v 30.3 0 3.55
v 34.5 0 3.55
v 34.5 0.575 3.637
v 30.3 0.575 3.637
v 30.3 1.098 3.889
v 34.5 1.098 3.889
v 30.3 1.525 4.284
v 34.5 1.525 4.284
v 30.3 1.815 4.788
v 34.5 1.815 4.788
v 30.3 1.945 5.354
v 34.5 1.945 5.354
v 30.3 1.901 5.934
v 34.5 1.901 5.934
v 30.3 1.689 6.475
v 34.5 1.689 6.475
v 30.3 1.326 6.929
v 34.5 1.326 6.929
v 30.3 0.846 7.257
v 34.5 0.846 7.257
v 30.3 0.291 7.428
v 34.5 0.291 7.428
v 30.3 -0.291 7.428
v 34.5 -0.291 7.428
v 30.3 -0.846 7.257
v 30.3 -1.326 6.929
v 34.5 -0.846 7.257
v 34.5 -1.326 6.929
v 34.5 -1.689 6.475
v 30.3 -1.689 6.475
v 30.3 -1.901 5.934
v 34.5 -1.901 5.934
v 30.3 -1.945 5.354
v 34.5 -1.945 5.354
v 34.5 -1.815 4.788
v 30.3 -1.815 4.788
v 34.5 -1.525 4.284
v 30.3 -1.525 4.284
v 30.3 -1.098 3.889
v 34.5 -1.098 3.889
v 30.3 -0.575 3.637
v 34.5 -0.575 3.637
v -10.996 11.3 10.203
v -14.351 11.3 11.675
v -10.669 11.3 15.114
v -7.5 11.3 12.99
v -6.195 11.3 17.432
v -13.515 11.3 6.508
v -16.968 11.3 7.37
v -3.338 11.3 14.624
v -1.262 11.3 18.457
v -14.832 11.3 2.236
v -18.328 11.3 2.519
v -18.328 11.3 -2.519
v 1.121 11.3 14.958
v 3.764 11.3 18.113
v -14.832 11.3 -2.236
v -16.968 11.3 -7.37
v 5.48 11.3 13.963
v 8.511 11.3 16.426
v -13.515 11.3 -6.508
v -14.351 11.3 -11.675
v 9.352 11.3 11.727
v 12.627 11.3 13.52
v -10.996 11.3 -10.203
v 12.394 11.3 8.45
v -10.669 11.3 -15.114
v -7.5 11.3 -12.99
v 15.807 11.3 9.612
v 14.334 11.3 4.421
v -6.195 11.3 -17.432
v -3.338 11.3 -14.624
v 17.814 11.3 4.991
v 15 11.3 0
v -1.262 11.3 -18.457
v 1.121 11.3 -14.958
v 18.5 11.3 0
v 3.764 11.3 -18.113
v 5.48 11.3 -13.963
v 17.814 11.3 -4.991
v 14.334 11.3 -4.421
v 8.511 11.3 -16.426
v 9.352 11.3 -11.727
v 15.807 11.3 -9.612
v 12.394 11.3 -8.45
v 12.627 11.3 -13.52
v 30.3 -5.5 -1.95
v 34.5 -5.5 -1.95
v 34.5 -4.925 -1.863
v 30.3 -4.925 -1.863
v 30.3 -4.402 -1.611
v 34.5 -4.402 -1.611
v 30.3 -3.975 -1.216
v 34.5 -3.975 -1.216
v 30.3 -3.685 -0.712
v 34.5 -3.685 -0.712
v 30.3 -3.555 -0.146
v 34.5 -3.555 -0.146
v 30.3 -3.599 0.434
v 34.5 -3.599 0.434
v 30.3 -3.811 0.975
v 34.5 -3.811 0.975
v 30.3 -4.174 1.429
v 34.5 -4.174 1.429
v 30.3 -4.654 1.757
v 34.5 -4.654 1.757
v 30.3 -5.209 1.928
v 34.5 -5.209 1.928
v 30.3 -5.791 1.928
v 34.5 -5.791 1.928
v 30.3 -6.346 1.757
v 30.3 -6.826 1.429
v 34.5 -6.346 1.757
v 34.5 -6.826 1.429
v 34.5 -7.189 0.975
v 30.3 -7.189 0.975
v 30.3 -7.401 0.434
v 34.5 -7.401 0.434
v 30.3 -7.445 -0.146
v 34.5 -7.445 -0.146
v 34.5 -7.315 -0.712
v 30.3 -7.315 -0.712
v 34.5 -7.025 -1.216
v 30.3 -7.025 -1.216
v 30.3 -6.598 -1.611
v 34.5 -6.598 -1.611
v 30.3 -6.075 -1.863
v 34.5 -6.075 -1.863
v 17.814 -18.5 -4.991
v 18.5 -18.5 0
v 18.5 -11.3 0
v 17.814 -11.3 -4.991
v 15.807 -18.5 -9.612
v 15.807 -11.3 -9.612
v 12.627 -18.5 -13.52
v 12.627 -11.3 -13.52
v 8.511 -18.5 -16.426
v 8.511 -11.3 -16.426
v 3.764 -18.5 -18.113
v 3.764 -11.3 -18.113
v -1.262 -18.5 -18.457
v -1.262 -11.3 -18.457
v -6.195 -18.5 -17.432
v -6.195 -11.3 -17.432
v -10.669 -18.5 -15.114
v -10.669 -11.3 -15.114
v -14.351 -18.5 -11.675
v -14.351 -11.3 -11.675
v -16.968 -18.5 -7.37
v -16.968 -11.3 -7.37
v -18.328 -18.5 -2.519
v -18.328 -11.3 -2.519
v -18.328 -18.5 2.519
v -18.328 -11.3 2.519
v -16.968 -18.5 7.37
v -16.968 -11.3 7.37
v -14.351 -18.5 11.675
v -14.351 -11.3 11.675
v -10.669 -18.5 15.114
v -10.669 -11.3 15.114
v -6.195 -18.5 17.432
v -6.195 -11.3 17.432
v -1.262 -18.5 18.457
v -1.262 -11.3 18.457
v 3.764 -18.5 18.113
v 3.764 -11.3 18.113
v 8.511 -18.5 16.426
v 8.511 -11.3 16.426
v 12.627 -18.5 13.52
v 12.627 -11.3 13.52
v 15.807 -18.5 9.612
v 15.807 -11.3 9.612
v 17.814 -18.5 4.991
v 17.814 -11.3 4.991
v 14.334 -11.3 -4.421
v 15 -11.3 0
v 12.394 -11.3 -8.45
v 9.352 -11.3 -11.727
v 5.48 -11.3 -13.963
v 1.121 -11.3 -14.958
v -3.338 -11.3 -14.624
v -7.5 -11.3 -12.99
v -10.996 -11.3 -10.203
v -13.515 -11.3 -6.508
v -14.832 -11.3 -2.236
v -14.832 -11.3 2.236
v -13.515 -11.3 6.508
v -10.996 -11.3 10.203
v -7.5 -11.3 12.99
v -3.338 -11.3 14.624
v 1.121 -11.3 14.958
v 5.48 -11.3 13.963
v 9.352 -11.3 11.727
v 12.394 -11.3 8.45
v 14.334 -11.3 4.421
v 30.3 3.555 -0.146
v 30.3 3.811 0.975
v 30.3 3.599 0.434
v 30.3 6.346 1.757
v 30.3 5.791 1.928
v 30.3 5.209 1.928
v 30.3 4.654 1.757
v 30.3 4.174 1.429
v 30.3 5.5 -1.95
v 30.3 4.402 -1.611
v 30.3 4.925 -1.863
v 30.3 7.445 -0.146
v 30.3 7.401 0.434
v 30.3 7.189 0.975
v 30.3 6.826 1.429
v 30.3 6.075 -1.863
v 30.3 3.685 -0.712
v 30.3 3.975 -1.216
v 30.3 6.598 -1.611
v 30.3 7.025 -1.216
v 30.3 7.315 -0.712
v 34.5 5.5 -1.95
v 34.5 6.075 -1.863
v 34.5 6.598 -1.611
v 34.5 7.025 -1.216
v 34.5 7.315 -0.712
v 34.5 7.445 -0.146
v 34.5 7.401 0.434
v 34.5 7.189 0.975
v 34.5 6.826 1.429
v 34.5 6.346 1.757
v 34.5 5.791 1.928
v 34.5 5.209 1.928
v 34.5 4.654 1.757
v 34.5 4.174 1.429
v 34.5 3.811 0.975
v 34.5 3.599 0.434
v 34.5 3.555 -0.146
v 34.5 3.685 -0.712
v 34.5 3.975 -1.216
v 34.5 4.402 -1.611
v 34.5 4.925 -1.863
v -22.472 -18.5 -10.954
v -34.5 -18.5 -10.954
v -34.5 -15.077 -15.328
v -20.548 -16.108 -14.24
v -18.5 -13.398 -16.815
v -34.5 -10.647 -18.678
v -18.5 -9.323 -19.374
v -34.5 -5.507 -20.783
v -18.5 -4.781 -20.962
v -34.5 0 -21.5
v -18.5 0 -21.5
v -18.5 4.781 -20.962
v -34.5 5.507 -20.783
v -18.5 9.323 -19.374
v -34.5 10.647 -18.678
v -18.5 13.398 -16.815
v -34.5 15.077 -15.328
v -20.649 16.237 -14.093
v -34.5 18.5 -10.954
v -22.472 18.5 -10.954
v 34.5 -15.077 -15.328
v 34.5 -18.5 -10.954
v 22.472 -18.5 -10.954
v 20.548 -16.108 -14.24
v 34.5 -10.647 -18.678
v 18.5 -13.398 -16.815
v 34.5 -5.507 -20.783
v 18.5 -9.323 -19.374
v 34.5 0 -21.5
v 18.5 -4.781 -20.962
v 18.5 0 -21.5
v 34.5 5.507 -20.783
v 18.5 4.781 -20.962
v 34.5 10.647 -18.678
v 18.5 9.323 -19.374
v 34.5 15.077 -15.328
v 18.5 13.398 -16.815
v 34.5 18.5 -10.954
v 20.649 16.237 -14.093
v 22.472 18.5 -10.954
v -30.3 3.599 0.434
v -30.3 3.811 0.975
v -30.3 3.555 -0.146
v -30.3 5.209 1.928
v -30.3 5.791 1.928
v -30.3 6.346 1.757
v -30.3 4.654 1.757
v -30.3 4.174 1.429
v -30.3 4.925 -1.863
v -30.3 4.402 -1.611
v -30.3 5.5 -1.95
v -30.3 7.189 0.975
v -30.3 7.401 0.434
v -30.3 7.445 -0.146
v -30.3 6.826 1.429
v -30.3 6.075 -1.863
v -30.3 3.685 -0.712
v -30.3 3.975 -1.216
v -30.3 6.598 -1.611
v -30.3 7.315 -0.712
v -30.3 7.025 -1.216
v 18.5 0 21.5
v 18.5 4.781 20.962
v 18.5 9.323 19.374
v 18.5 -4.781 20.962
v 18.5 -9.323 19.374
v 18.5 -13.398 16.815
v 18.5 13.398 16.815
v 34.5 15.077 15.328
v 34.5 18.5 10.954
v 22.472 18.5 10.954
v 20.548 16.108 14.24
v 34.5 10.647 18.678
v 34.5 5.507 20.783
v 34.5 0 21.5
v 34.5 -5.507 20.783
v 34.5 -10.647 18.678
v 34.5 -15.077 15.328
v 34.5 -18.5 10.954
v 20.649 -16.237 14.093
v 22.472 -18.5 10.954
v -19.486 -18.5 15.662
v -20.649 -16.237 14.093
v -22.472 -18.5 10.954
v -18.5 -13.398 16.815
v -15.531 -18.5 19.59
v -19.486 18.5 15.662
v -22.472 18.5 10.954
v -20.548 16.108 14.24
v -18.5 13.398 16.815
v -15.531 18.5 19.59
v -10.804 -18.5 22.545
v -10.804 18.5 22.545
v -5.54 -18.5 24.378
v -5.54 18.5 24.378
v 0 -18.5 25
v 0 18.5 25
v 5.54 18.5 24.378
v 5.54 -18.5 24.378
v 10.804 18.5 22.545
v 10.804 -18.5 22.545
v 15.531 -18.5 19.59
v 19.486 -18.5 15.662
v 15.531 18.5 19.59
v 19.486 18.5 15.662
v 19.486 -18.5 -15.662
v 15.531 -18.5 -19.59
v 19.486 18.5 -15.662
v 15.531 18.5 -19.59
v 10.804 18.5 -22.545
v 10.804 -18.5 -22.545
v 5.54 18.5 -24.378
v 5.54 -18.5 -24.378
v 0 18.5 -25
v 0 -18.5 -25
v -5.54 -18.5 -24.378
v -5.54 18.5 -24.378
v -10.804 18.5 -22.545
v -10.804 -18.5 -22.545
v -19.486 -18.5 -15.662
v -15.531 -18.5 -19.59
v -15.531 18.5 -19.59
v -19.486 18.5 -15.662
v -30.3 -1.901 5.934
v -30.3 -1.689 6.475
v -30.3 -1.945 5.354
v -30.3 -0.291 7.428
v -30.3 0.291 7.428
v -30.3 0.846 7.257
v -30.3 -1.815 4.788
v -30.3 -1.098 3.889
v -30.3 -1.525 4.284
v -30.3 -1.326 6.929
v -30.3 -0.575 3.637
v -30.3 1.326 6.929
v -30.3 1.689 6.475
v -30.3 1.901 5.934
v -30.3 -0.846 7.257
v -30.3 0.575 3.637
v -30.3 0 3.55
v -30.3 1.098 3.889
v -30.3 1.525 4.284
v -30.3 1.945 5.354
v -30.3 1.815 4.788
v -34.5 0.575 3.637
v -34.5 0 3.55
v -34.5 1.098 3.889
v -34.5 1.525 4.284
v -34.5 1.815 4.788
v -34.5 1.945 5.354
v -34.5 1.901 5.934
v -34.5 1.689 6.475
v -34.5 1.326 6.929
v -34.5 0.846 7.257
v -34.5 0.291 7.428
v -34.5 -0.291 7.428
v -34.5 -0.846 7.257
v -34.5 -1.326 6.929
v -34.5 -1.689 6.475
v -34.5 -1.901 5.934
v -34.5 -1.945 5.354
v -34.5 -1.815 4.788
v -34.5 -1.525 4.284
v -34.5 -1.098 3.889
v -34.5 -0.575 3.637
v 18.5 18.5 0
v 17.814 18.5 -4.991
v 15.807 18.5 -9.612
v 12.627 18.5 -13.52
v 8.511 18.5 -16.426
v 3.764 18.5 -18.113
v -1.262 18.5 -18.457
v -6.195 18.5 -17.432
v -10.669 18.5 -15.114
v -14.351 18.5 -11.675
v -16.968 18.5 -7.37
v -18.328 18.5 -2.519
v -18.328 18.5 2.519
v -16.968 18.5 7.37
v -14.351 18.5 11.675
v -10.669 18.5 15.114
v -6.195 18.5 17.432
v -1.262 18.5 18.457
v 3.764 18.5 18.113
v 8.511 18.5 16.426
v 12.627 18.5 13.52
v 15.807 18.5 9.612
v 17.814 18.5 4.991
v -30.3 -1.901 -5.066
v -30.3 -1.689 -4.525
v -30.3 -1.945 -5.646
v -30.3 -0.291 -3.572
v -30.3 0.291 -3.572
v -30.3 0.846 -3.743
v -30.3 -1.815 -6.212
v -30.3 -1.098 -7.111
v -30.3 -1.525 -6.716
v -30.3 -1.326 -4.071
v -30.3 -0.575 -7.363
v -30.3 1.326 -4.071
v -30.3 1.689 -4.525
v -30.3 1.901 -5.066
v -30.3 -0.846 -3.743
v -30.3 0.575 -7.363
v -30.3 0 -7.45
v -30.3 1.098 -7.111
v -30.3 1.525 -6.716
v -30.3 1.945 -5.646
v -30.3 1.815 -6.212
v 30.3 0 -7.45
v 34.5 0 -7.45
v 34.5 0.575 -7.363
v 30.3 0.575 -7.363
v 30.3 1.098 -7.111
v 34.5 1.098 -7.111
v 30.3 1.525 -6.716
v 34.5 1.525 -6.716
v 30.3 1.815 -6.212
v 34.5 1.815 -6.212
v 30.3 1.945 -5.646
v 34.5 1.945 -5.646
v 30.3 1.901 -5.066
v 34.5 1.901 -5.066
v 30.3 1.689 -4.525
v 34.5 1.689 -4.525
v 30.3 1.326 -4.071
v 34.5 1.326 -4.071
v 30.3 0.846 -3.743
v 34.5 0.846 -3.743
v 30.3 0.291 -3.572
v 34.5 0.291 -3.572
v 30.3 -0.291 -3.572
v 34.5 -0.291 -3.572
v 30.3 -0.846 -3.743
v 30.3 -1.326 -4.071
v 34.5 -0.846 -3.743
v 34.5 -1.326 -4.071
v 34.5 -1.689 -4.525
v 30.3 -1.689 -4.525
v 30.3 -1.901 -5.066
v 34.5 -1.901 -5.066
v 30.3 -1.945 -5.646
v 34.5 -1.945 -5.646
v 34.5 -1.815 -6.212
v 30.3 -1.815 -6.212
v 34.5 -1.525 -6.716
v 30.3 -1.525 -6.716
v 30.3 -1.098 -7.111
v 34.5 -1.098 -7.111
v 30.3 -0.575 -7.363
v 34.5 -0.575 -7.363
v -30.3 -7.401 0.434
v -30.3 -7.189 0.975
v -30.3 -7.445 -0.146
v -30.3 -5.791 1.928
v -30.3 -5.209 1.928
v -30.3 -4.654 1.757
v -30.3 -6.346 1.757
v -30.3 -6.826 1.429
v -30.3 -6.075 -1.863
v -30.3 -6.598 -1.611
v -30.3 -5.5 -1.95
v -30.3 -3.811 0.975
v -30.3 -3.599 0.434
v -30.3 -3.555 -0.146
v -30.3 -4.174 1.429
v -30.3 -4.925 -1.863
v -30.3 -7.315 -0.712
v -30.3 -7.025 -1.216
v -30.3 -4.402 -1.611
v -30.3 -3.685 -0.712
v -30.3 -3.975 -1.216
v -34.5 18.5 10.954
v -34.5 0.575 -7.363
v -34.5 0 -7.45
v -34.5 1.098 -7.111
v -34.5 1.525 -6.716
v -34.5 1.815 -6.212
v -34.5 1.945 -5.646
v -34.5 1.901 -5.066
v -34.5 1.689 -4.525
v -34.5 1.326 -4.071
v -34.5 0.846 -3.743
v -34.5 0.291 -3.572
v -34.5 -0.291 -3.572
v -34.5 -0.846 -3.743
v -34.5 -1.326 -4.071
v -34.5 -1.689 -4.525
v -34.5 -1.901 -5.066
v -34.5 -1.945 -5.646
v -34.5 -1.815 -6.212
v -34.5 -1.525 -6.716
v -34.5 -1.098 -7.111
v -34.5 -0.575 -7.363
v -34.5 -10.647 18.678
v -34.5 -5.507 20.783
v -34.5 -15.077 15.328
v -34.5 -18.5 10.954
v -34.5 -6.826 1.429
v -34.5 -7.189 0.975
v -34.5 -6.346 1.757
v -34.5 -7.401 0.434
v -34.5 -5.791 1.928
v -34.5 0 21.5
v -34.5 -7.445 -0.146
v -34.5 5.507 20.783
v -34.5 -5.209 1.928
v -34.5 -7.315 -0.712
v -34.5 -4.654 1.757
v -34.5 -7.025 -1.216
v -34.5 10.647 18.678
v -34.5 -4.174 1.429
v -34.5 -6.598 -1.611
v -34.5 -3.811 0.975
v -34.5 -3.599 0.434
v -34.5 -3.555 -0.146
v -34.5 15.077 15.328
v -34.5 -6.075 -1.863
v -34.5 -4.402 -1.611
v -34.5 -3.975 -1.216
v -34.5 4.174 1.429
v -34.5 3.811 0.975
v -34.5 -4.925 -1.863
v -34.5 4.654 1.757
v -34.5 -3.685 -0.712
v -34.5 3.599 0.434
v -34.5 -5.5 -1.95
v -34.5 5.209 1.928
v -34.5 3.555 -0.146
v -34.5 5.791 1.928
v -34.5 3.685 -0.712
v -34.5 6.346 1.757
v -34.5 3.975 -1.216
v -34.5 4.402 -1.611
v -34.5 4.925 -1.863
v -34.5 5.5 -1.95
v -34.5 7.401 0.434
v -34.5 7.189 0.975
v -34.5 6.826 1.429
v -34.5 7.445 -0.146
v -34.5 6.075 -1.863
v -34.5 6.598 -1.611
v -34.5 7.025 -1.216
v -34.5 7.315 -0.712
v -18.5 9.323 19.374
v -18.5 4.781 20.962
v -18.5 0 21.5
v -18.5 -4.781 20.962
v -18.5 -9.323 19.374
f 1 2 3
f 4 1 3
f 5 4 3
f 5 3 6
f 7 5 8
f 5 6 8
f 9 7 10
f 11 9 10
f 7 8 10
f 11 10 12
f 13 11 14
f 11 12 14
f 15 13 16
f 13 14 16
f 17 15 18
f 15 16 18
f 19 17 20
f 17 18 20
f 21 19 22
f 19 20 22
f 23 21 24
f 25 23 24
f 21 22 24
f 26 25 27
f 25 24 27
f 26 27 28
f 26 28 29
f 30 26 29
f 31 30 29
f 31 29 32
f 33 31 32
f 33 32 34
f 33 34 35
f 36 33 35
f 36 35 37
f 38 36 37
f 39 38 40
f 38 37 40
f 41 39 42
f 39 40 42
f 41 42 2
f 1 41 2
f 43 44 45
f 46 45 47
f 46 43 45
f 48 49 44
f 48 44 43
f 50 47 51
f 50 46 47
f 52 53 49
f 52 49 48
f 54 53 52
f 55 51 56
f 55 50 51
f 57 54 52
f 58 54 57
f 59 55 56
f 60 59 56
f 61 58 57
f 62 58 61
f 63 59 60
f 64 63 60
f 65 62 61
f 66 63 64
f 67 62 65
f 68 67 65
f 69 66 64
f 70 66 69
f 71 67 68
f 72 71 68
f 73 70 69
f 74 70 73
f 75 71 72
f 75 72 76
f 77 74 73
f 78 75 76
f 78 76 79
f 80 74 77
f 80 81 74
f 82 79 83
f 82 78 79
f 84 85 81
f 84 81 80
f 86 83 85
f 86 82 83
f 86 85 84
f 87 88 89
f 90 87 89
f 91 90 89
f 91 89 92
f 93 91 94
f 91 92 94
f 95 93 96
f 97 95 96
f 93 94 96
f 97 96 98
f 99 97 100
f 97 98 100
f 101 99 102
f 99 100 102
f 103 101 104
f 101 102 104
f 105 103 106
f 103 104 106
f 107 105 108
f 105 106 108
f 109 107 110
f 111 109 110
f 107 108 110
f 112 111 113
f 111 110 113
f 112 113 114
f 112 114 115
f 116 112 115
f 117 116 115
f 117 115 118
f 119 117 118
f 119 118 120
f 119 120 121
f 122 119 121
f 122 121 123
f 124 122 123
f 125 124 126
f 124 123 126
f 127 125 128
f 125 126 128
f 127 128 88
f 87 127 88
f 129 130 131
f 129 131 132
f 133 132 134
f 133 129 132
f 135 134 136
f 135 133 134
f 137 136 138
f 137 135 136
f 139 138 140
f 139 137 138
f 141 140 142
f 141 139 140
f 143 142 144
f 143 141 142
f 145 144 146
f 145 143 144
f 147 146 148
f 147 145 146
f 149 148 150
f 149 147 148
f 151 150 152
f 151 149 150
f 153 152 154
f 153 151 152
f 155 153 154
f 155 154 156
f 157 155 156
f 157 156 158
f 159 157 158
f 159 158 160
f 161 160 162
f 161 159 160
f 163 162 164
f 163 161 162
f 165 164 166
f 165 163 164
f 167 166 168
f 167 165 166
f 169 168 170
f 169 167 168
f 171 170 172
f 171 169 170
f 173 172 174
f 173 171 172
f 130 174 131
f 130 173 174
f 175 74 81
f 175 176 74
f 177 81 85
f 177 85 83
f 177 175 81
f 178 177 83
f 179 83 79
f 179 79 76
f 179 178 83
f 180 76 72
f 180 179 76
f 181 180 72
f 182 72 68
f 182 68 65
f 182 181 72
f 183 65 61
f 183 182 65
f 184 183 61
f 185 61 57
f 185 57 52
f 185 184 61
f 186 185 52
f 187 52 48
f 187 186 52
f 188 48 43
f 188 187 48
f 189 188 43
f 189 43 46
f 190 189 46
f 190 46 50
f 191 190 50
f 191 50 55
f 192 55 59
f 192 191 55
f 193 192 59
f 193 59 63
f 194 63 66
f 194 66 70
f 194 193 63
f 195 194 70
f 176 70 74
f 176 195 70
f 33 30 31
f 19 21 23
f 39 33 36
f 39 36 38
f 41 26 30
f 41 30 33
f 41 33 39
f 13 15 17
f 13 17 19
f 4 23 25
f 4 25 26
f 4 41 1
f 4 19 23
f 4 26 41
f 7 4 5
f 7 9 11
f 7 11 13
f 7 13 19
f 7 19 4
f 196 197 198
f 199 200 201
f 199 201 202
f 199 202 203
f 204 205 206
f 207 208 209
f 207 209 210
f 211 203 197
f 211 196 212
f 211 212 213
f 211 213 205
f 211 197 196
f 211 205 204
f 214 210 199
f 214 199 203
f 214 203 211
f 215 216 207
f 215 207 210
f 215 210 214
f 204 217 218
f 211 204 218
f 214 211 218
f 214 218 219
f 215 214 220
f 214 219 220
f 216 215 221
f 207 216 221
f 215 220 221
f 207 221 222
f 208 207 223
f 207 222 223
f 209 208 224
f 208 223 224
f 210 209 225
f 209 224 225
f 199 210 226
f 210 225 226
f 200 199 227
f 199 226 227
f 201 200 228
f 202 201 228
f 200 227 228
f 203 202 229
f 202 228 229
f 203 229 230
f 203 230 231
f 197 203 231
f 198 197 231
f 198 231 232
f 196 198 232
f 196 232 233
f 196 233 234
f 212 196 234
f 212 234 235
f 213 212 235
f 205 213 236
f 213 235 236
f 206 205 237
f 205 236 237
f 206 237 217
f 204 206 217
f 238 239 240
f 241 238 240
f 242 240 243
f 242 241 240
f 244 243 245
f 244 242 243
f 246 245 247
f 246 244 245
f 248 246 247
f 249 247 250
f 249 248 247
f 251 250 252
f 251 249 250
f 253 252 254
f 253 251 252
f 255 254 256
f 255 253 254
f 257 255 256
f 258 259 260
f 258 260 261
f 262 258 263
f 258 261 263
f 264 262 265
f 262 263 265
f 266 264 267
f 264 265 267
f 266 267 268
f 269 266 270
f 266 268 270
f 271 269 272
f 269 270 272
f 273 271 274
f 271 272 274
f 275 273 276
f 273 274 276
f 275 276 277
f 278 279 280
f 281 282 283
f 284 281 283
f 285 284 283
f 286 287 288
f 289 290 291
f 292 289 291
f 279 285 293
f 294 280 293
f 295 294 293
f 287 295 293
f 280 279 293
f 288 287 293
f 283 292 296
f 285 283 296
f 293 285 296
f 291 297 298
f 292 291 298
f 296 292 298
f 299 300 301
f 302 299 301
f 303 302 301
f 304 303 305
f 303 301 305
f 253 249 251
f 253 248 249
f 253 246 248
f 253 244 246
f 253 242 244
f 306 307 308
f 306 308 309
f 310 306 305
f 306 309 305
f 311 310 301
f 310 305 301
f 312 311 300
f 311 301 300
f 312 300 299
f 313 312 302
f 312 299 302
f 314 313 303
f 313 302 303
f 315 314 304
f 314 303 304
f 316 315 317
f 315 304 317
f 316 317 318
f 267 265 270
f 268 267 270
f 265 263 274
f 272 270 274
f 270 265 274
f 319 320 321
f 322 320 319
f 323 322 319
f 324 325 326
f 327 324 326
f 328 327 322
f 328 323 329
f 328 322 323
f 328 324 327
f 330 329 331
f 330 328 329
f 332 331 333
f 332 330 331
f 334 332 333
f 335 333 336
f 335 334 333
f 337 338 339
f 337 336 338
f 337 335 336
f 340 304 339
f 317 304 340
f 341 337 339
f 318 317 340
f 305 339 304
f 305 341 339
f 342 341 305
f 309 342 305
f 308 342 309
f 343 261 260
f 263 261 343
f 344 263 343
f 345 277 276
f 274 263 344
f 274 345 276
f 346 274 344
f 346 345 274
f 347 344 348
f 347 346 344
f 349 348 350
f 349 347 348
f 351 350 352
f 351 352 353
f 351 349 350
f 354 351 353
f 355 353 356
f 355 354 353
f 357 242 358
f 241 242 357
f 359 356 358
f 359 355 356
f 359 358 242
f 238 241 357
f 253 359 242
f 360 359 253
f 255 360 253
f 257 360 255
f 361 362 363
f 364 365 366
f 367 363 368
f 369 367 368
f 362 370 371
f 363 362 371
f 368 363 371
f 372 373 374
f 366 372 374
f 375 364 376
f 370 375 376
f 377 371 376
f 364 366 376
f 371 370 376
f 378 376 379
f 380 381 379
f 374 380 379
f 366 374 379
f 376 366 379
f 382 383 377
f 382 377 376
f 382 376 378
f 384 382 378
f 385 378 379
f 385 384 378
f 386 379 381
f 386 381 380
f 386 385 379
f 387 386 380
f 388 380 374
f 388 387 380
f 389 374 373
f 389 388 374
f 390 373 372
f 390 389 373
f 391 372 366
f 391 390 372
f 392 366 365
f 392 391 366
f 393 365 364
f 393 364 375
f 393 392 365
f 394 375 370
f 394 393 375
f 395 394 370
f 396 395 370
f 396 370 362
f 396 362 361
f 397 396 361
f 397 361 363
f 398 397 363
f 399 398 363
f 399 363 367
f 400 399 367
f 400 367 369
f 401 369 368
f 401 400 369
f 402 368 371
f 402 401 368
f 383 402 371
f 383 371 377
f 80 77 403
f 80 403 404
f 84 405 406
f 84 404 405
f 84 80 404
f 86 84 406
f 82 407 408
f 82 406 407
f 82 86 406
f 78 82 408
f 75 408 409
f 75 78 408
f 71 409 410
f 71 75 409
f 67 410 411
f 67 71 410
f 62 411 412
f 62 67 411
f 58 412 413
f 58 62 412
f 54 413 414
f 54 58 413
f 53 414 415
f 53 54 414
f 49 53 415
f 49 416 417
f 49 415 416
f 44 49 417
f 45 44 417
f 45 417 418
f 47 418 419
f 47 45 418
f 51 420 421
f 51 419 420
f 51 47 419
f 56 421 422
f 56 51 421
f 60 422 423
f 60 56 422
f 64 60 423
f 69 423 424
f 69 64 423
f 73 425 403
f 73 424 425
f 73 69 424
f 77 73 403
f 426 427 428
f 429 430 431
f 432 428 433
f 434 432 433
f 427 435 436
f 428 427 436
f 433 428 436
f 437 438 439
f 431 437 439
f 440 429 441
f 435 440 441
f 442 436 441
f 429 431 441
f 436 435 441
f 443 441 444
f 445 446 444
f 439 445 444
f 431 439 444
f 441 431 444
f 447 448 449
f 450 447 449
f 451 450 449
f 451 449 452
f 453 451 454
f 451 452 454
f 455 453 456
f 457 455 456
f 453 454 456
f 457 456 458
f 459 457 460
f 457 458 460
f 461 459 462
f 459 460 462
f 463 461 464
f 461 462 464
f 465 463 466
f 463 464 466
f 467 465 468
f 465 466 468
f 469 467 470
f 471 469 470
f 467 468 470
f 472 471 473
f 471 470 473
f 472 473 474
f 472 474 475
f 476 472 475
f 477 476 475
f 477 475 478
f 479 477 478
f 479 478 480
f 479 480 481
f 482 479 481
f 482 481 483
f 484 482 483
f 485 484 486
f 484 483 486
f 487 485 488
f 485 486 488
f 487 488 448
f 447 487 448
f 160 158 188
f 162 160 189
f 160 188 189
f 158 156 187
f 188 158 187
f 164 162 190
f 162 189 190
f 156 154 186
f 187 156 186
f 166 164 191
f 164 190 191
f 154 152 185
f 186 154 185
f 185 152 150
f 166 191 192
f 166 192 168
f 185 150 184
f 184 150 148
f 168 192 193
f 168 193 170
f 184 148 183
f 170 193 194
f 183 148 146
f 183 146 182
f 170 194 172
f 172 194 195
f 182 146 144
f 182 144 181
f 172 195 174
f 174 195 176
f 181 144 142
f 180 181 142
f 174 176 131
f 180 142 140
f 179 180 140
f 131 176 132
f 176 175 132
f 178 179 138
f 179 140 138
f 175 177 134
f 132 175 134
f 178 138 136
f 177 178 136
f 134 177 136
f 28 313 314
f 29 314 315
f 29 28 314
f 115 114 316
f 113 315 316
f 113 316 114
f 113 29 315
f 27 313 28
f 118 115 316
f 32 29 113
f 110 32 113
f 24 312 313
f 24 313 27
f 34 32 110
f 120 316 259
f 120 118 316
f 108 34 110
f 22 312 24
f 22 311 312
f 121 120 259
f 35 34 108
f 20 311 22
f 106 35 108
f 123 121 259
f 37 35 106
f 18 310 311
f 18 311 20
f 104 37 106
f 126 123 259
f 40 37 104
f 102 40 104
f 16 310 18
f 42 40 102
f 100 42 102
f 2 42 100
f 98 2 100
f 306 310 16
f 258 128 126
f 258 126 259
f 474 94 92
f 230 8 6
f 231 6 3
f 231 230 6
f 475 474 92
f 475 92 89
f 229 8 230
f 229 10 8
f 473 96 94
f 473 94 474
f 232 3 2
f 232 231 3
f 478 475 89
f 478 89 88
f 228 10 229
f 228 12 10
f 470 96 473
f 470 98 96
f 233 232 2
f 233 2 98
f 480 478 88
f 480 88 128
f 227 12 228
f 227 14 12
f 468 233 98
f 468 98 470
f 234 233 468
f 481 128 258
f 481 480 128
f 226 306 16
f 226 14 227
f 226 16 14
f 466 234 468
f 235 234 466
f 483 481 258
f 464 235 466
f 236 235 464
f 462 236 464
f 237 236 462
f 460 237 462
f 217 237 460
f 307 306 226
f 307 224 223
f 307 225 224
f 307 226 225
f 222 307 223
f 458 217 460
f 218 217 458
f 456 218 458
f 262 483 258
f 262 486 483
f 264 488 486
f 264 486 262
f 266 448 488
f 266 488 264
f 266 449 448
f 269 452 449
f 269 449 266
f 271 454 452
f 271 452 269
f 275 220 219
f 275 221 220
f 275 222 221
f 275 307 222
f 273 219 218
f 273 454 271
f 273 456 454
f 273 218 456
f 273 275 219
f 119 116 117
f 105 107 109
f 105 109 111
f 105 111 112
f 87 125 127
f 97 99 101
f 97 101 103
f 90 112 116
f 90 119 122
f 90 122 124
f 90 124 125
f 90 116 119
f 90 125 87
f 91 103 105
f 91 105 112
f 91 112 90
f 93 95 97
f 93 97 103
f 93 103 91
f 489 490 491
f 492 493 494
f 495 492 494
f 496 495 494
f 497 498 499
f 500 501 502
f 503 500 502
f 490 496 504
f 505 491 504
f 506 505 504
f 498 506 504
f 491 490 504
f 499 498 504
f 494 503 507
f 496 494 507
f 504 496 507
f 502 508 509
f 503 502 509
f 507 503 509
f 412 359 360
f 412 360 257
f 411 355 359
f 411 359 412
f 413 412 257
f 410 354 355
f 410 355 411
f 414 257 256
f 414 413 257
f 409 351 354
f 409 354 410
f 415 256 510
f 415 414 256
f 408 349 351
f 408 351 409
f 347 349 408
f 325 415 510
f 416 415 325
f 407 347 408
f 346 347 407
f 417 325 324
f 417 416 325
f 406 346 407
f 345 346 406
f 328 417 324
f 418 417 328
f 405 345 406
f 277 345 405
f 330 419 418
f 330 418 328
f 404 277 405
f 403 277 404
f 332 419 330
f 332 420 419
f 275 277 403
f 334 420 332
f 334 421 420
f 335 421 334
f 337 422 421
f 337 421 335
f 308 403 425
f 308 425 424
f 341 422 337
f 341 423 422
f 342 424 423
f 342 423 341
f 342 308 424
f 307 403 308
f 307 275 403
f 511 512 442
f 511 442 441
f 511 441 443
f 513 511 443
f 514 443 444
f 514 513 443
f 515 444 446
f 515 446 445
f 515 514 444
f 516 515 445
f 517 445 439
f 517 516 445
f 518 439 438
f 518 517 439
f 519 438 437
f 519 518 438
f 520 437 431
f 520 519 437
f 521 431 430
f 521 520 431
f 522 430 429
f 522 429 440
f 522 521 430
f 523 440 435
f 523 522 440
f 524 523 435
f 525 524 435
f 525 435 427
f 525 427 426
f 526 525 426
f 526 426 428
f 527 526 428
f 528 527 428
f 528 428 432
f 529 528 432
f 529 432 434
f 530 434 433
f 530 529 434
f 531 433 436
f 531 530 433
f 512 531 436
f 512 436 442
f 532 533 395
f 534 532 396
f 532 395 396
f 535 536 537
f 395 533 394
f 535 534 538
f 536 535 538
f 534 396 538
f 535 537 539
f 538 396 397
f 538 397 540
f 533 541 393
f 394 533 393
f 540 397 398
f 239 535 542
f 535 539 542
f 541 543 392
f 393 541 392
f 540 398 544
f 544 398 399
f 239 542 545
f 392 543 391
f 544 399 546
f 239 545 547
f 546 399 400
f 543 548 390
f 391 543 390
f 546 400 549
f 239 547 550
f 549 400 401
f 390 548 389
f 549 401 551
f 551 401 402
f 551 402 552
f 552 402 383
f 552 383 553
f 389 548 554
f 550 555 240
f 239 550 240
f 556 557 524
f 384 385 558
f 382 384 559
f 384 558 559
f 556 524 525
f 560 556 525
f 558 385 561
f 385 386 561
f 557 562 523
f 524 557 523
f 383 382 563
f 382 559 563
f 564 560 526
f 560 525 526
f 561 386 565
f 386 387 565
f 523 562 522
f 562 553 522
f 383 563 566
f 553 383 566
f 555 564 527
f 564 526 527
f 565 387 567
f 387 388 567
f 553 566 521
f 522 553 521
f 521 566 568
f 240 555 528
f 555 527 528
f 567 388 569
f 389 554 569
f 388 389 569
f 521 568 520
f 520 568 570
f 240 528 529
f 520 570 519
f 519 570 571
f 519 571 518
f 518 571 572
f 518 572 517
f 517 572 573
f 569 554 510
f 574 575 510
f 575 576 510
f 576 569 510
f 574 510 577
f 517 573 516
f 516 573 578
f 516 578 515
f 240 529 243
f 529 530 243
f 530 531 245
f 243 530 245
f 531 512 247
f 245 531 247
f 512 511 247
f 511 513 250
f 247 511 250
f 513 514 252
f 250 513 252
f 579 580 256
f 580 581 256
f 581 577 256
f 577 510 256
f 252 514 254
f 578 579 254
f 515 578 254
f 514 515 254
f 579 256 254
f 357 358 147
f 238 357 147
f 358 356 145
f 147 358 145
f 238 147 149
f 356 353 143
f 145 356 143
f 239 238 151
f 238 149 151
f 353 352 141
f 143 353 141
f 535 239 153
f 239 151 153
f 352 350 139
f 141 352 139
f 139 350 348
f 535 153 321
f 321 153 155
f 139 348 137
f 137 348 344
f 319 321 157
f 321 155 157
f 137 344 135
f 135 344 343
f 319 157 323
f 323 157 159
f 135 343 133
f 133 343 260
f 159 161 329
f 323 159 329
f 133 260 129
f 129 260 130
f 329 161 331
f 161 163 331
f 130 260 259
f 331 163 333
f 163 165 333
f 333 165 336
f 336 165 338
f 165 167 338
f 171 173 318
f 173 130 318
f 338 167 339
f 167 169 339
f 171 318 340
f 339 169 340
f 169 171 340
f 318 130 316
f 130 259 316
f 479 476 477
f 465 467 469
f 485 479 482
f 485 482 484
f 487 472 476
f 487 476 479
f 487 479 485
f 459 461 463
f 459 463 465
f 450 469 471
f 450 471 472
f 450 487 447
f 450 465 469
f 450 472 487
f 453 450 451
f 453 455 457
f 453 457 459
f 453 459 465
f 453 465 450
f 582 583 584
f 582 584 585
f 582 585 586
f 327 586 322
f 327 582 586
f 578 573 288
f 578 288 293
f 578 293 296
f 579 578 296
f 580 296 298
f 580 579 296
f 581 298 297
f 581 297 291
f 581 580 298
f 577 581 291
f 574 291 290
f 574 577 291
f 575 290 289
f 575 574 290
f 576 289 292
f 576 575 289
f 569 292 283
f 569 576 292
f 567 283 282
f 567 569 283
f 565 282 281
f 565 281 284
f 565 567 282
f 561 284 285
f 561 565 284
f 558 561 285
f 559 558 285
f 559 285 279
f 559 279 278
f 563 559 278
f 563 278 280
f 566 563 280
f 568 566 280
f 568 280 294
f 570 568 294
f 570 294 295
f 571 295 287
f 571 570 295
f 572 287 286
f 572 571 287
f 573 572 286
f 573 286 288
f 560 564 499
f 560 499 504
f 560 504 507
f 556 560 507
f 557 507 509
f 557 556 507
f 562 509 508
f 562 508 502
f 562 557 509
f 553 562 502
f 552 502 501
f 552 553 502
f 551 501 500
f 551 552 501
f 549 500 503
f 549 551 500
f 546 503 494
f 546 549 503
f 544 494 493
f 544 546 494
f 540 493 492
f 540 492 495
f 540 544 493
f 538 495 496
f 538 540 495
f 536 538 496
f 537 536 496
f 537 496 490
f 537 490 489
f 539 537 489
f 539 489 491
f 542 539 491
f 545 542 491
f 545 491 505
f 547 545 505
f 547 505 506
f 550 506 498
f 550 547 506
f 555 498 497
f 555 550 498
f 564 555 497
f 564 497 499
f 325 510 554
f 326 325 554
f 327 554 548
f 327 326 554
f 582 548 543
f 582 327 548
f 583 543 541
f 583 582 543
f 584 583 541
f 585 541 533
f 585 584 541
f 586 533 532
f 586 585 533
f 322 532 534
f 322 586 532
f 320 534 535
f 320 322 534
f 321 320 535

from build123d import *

# Parameters (mm, degrees)
SKIZZE1_R                            = 25
SKIZZE1_R_2                          = 18.5
AUFSATZ_LINEAR_AUSTRAGEN1_DEPTH      = 18.5
SKIZZE2_R                            = 18.5
SKIZZE2_R_2                          = 15
AUFSATZ_LINEAR_AUSTRAGEN2_DEPTH      = 11.3
SKIZZE3_R                            = 21.5
AUFSATZ_LINEAR_AUSTRAGEN3_DEPTH      = 16
SKIZZE4_R                            = 1.95
SCHNITT_LINEAR_AUSTRAGEN1_DEPTH      = 4.2
SCHNITT_LINEAR_AUSTRAGEN2_DEPTH      = 67.290769445
SCHNITT_LINEAR_AUSTRAGEN2_DEPTH_BACK = 67.290769445
SKIZZE5_OUTSIDE_W                    = 64.09
SKIZZE5_OUTSIDE_H                    = 71.09
SKIZZE5_OUTSIDE_W_2                  = 37
SKIZZE5_OUTSIDE_H_2                  = 50


with BuildPart() as part:
    # Skizze1 → Aufsatz-Linear austragen1 (new, symmetric)
    with BuildSketch(Plane(origin=(0, 0, 0), x_dir=(1, 0, 0), z_dir=(0, 1, 0))):
        Circle(SKIZZE1_R)
        Circle(SKIZZE1_R_2, mode=Mode.SUBTRACT)
    extrude(amount=AUFSATZ_LINEAR_AUSTRAGEN1_DEPTH, both=True)

    # Skizze2 → Aufsatz-Linear austragen2 (add, symmetric)
    with BuildSketch(Plane(origin=(0, 0, 0), x_dir=(1, 0, 0), z_dir=(0, 1, 0))):
        Circle(SKIZZE2_R)
        Circle(SKIZZE2_R_2, mode=Mode.SUBTRACT)
    extrude(amount=AUFSATZ_LINEAR_AUSTRAGEN2_DEPTH, both=True)

    # Skizze3 → Aufsatz-Linear austragen3 (add)
    with BuildSketch(Plane(origin=(18.5, 0, 0), x_dir=(0, 0, -1), z_dir=(1, 0, 0))):
        Circle(SKIZZE3_R)
    aufsatz_linear_austragen3 = extrude(amount=AUFSATZ_LINEAR_AUSTRAGEN3_DEPTH)

    # Skizze4 → Schnitt-Linear austragen1 (cut)
    with BuildSketch(Plane(origin=(34.5, 0, 0), x_dir=(0, 0, -1), z_dir=(1, 0, 0))):
        with Locations((-5.5, 0)):
            Circle(SKIZZE4_R)
        with Locations((0, 5.5)):
            Circle(SKIZZE4_R)
        with Locations((5.5, 0)):
            Circle(SKIZZE4_R)
        with Locations((0, -5.5)):
            Circle(SKIZZE4_R)
    schnitt_linear_austragen1 = extrude(amount=-SCHNITT_LINEAR_AUSTRAGEN1_DEPTH, mode=Mode.SUBTRACT)

    # Spiegeln1: Aufsatz-Linear austragen3, Schnitt-Linear austragen1 across plane
    add(aufsatz_linear_austragen3.mirror(Plane(origin=(0, 0, 0), x_dir=(0, 0, 1), z_dir=(1, 0, 0))))
    add(schnitt_linear_austragen1.mirror(Plane(origin=(0, 0, 0), x_dir=(0, 0, 1), z_dir=(1, 0, 0))), mode=Mode.SUBTRACT)

    # Skizze5 outside → Schnitt-Linear austragen2 (cut, two sides: drawn at the far end of the back side and taken through both)
    with BuildSketch(Plane(origin=(0, 29.28598322, 0), x_dir=(0, -1, 0), z_dir=(-1, 0, 0)).offset(-SCHNITT_LINEAR_AUSTRAGEN2_DEPTH_BACK)):
        with Locations((29.286, 0)):
            Rectangle(SKIZZE5_OUTSIDE_W, SKIZZE5_OUTSIDE_H)
        with Locations((29.28598322, 0)):
            Rectangle(SKIZZE5_OUTSIDE_W_2, SKIZZE5_OUTSIDE_H_2, mode=Mode.SUBTRACT)
    extrude(amount=SCHNITT_LINEAR_AUSTRAGEN2_DEPTH + SCHNITT_LINEAR_AUSTRAGEN2_DEPTH_BACK, mode=Mode.SUBTRACT)


solid = part.part
